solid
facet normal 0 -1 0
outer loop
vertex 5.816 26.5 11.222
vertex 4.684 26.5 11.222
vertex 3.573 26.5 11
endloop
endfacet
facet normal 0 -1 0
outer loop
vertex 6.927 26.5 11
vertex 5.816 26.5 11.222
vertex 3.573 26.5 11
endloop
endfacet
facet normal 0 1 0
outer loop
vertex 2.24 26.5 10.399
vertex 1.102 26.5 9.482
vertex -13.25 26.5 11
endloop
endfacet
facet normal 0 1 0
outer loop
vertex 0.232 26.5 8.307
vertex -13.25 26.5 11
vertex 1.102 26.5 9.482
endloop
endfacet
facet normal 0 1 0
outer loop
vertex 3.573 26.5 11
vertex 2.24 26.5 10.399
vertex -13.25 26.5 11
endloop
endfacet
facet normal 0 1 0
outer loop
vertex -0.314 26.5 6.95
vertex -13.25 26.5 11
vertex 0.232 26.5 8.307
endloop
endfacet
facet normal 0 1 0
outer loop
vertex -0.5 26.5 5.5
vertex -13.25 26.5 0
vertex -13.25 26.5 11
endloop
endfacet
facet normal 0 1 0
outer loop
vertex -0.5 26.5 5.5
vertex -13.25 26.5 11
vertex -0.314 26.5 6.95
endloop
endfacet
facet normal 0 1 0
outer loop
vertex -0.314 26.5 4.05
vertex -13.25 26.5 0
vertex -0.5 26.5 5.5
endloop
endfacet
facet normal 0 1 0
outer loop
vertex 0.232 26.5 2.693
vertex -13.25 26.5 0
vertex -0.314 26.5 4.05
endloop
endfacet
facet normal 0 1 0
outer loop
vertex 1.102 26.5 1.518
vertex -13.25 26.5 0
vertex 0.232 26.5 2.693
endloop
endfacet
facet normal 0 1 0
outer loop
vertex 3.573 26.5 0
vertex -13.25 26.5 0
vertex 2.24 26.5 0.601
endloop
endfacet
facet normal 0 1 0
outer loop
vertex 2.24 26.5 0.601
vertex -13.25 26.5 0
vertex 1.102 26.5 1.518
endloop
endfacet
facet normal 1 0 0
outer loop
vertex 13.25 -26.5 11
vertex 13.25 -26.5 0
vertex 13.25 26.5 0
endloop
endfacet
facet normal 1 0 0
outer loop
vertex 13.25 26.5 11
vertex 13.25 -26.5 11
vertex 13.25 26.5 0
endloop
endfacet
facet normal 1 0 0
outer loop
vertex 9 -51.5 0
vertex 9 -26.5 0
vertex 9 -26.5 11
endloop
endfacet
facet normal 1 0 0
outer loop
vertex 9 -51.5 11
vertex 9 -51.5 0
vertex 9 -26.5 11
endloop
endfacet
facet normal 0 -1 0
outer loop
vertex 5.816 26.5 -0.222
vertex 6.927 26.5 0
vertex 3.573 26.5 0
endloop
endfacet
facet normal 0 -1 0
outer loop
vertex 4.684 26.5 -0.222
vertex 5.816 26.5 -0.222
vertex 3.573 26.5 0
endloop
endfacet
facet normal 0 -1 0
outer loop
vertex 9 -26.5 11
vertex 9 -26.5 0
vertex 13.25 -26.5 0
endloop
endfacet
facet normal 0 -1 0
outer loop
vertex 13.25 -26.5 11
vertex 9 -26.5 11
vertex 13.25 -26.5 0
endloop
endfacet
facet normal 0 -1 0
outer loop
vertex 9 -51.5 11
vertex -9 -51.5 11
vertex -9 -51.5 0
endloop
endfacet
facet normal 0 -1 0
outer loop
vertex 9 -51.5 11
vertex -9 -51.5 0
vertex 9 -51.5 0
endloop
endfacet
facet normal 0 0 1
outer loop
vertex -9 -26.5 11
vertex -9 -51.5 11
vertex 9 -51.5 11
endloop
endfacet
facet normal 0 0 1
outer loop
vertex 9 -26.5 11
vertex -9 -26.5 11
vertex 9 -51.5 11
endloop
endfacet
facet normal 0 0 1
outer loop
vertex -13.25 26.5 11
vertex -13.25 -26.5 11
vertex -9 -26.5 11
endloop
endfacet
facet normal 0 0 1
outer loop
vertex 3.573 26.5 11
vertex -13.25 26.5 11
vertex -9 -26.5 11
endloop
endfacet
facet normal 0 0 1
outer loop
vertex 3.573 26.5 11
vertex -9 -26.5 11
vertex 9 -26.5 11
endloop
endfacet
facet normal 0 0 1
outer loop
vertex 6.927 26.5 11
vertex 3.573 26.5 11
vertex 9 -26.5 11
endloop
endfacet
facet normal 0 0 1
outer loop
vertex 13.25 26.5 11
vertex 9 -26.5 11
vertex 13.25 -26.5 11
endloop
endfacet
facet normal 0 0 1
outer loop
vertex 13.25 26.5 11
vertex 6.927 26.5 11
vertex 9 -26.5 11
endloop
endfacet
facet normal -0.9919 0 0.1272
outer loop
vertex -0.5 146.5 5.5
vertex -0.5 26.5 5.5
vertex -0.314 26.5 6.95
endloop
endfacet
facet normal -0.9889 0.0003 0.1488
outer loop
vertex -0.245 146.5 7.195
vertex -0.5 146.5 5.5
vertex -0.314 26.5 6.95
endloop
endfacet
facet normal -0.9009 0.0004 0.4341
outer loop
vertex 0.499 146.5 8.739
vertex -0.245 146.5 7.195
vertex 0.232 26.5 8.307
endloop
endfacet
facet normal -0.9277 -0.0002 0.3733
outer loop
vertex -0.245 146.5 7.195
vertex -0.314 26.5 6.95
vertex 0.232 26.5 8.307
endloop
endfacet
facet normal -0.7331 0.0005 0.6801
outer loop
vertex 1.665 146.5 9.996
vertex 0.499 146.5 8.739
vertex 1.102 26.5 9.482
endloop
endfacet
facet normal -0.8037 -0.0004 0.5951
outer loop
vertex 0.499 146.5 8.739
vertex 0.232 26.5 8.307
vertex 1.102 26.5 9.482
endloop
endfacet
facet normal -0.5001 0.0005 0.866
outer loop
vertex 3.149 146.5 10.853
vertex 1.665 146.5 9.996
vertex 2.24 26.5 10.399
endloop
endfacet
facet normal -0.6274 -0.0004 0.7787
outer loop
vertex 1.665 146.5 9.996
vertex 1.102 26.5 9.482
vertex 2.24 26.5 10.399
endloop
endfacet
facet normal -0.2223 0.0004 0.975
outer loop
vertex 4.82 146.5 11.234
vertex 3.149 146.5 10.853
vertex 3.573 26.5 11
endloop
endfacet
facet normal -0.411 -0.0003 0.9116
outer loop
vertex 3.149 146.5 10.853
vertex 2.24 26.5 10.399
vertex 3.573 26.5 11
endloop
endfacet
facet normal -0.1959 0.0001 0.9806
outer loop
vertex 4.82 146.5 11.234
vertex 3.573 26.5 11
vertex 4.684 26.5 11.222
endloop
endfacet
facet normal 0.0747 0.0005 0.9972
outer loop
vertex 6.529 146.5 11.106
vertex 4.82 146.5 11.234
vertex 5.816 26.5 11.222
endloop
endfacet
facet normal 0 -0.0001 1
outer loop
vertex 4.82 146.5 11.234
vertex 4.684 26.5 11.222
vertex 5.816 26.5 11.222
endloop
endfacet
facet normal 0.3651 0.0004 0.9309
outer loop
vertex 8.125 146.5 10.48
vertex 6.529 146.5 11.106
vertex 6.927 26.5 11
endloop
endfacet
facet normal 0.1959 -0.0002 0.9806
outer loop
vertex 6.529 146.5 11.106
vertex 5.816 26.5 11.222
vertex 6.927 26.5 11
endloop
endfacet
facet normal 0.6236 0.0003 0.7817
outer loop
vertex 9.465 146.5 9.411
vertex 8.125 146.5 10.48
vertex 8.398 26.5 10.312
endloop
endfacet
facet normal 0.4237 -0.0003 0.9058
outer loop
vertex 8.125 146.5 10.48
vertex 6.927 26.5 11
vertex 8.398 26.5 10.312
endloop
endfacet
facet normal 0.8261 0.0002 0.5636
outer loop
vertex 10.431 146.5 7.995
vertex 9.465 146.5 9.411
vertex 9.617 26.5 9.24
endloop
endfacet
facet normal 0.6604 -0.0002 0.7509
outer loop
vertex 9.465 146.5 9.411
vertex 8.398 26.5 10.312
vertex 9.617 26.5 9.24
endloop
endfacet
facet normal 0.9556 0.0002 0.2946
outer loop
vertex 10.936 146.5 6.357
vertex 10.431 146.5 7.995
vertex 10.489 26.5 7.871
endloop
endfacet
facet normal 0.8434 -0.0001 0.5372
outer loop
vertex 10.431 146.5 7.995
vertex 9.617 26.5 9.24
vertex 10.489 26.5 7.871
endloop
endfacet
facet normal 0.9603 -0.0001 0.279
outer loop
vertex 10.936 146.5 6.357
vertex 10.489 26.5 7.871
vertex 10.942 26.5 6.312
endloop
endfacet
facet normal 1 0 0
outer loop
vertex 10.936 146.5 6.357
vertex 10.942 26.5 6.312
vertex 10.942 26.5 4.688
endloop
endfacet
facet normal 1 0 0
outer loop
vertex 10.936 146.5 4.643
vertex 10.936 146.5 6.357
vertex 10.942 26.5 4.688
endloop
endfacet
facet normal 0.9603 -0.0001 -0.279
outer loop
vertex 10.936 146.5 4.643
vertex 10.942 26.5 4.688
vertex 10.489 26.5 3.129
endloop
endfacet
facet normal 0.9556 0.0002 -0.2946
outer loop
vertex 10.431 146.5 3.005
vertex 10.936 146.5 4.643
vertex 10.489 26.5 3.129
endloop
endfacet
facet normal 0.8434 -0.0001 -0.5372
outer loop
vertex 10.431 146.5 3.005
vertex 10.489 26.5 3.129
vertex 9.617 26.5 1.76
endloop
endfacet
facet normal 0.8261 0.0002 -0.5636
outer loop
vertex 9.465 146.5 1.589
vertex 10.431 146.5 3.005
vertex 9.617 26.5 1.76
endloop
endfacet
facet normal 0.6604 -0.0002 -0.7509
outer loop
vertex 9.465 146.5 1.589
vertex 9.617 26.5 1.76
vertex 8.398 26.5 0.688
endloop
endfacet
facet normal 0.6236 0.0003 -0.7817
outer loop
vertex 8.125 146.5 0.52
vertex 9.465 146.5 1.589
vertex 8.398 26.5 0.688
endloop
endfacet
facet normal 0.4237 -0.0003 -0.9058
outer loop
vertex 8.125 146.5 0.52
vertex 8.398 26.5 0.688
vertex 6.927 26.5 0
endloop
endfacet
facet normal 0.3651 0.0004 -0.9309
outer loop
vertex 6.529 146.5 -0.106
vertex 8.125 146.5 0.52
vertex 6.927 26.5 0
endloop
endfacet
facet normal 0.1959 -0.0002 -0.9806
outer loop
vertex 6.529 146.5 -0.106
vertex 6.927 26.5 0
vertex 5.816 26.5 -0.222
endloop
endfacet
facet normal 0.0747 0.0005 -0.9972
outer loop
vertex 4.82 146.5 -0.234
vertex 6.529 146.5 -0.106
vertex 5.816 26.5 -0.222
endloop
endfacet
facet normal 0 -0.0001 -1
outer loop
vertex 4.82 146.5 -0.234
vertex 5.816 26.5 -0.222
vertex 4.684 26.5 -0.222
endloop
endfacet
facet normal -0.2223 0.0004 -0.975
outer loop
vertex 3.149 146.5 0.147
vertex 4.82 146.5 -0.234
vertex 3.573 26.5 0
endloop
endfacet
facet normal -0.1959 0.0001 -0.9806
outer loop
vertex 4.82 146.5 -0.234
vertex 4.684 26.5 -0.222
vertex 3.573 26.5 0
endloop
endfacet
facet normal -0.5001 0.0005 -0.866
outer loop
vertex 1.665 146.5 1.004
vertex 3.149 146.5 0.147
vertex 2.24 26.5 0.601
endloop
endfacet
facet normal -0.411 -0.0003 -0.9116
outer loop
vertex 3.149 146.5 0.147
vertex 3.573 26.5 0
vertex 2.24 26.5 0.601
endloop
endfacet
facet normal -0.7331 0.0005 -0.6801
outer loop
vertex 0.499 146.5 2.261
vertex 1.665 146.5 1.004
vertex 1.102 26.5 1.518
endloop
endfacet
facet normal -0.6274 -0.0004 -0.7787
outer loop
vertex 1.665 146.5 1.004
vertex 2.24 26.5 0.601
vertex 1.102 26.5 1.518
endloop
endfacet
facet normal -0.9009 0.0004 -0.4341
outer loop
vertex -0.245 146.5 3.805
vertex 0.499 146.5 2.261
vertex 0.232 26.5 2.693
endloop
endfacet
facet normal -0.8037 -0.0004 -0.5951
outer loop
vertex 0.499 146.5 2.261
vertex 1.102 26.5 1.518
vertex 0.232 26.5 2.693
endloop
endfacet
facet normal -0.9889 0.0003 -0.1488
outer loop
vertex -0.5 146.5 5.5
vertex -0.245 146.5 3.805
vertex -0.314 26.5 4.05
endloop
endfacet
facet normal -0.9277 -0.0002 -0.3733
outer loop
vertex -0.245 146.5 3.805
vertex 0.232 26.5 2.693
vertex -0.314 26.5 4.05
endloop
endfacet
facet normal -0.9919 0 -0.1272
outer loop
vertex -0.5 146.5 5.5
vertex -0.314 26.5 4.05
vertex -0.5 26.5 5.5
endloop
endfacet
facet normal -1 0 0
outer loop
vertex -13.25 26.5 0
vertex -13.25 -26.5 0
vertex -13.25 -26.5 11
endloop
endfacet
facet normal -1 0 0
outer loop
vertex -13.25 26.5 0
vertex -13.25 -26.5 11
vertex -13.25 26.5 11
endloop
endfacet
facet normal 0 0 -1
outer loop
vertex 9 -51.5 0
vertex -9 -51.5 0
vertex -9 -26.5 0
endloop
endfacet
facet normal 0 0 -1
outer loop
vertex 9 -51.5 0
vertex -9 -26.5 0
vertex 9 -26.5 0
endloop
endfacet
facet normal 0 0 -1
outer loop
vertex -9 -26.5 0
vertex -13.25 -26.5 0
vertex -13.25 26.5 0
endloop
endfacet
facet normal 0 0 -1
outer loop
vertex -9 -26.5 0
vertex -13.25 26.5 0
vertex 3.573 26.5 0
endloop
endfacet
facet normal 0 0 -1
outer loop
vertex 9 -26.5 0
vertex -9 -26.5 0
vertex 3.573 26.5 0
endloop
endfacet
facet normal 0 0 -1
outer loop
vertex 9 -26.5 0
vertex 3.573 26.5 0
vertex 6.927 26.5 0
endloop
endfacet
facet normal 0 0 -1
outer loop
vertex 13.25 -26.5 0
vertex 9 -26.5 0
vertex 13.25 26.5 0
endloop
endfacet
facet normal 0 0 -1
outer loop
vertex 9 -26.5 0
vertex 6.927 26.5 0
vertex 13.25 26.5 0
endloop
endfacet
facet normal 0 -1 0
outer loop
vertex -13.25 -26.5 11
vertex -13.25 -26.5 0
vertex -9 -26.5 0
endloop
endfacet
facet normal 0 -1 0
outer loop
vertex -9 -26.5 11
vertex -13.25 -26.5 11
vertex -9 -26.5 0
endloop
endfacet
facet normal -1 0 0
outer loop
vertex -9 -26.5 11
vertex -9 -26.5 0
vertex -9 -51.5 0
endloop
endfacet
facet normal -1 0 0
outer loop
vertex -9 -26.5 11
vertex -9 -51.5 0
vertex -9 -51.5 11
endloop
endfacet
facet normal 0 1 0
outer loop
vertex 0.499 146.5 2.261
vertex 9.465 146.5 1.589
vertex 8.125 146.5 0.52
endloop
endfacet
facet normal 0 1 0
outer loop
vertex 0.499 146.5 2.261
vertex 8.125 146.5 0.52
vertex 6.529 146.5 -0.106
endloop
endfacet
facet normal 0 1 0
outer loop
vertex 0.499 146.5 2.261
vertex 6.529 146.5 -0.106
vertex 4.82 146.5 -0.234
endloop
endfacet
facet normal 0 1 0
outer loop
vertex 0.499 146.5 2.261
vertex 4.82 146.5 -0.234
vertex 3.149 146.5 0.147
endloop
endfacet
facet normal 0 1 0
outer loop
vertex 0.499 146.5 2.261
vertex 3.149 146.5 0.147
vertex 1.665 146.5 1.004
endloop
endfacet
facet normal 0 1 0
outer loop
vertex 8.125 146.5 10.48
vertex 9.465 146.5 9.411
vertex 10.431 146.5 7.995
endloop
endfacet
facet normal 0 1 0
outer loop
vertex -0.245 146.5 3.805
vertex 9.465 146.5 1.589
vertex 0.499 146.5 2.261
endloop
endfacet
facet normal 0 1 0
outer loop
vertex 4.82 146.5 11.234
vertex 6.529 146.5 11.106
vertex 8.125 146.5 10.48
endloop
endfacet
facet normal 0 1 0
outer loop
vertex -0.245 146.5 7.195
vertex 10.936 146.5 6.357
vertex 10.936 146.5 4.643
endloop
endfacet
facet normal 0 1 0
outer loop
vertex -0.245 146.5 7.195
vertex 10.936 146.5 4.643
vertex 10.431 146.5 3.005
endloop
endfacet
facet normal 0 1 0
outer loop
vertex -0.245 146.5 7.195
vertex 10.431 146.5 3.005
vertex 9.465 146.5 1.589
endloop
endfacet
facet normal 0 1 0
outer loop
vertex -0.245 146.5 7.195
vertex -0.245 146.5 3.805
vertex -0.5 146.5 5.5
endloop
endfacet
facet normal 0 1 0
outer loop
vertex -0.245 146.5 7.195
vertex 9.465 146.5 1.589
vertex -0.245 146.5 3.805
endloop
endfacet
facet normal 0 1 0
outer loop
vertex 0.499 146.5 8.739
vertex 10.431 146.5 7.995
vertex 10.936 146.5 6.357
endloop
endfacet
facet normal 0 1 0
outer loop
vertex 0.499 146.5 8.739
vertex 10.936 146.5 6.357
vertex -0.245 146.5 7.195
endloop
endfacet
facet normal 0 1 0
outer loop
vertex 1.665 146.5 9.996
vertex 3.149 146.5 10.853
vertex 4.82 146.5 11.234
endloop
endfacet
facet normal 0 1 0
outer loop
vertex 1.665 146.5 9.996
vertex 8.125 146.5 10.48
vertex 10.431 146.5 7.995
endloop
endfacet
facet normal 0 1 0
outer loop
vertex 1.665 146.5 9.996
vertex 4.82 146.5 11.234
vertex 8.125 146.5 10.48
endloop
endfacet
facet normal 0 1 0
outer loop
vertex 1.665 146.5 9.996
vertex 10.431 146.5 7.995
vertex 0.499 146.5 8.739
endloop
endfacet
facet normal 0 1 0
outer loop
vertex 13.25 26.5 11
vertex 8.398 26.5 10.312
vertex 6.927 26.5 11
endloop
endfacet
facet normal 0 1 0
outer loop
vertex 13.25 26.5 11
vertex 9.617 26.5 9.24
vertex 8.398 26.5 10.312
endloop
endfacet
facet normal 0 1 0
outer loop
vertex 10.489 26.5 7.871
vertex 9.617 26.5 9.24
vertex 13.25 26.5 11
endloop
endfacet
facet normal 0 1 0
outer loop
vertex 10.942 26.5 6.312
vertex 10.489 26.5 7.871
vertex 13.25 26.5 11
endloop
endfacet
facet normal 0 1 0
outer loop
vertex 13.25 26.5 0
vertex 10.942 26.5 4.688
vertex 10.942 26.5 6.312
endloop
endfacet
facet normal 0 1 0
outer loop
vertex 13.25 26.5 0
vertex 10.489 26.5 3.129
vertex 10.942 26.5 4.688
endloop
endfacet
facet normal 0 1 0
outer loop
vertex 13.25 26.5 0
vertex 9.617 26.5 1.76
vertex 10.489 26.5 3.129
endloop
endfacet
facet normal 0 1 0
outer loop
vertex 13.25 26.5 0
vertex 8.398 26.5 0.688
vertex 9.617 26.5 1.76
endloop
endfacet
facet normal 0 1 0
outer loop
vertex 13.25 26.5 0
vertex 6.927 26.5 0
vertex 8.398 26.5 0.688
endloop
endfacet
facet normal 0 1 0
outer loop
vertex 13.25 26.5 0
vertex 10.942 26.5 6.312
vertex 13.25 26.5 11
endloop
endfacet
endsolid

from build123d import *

# Parameters (mm, degrees)
F0_W     = 26.5
F0_H     = 53
F1_DEPTH = 11
F2_R     = 5.75
F3_DEPTH = 120
F4_W     = 18
F4_H     = 11
F5_DEPTH = 25


with BuildPart() as f1:
    # F0 (on Top) → F1 (new body)
    with BuildSketch(Plane.XY):
        Rectangle(F0_W, F0_H)
    extrude(amount=F1_DEPTH)

    # F2 (on face) → F3 (join)
    with BuildSketch(Plane(origin=(0, 26.5, 0), x_dir=(-1, 0, 0), z_dir=(0, 1, 0))):
        with Locations((-5.25, 5.5)):
            Circle(F2_R)
    extrude(amount=F3_DEPTH)

    # F4 (on face) → F5 (join)
    with BuildSketch(Plane.XZ.offset(26.5)):
        with Locations((0, 5.5)):
            Rectangle(F4_W, F4_H)
    extrude(amount=F5_DEPTH)


solid = f1.part
